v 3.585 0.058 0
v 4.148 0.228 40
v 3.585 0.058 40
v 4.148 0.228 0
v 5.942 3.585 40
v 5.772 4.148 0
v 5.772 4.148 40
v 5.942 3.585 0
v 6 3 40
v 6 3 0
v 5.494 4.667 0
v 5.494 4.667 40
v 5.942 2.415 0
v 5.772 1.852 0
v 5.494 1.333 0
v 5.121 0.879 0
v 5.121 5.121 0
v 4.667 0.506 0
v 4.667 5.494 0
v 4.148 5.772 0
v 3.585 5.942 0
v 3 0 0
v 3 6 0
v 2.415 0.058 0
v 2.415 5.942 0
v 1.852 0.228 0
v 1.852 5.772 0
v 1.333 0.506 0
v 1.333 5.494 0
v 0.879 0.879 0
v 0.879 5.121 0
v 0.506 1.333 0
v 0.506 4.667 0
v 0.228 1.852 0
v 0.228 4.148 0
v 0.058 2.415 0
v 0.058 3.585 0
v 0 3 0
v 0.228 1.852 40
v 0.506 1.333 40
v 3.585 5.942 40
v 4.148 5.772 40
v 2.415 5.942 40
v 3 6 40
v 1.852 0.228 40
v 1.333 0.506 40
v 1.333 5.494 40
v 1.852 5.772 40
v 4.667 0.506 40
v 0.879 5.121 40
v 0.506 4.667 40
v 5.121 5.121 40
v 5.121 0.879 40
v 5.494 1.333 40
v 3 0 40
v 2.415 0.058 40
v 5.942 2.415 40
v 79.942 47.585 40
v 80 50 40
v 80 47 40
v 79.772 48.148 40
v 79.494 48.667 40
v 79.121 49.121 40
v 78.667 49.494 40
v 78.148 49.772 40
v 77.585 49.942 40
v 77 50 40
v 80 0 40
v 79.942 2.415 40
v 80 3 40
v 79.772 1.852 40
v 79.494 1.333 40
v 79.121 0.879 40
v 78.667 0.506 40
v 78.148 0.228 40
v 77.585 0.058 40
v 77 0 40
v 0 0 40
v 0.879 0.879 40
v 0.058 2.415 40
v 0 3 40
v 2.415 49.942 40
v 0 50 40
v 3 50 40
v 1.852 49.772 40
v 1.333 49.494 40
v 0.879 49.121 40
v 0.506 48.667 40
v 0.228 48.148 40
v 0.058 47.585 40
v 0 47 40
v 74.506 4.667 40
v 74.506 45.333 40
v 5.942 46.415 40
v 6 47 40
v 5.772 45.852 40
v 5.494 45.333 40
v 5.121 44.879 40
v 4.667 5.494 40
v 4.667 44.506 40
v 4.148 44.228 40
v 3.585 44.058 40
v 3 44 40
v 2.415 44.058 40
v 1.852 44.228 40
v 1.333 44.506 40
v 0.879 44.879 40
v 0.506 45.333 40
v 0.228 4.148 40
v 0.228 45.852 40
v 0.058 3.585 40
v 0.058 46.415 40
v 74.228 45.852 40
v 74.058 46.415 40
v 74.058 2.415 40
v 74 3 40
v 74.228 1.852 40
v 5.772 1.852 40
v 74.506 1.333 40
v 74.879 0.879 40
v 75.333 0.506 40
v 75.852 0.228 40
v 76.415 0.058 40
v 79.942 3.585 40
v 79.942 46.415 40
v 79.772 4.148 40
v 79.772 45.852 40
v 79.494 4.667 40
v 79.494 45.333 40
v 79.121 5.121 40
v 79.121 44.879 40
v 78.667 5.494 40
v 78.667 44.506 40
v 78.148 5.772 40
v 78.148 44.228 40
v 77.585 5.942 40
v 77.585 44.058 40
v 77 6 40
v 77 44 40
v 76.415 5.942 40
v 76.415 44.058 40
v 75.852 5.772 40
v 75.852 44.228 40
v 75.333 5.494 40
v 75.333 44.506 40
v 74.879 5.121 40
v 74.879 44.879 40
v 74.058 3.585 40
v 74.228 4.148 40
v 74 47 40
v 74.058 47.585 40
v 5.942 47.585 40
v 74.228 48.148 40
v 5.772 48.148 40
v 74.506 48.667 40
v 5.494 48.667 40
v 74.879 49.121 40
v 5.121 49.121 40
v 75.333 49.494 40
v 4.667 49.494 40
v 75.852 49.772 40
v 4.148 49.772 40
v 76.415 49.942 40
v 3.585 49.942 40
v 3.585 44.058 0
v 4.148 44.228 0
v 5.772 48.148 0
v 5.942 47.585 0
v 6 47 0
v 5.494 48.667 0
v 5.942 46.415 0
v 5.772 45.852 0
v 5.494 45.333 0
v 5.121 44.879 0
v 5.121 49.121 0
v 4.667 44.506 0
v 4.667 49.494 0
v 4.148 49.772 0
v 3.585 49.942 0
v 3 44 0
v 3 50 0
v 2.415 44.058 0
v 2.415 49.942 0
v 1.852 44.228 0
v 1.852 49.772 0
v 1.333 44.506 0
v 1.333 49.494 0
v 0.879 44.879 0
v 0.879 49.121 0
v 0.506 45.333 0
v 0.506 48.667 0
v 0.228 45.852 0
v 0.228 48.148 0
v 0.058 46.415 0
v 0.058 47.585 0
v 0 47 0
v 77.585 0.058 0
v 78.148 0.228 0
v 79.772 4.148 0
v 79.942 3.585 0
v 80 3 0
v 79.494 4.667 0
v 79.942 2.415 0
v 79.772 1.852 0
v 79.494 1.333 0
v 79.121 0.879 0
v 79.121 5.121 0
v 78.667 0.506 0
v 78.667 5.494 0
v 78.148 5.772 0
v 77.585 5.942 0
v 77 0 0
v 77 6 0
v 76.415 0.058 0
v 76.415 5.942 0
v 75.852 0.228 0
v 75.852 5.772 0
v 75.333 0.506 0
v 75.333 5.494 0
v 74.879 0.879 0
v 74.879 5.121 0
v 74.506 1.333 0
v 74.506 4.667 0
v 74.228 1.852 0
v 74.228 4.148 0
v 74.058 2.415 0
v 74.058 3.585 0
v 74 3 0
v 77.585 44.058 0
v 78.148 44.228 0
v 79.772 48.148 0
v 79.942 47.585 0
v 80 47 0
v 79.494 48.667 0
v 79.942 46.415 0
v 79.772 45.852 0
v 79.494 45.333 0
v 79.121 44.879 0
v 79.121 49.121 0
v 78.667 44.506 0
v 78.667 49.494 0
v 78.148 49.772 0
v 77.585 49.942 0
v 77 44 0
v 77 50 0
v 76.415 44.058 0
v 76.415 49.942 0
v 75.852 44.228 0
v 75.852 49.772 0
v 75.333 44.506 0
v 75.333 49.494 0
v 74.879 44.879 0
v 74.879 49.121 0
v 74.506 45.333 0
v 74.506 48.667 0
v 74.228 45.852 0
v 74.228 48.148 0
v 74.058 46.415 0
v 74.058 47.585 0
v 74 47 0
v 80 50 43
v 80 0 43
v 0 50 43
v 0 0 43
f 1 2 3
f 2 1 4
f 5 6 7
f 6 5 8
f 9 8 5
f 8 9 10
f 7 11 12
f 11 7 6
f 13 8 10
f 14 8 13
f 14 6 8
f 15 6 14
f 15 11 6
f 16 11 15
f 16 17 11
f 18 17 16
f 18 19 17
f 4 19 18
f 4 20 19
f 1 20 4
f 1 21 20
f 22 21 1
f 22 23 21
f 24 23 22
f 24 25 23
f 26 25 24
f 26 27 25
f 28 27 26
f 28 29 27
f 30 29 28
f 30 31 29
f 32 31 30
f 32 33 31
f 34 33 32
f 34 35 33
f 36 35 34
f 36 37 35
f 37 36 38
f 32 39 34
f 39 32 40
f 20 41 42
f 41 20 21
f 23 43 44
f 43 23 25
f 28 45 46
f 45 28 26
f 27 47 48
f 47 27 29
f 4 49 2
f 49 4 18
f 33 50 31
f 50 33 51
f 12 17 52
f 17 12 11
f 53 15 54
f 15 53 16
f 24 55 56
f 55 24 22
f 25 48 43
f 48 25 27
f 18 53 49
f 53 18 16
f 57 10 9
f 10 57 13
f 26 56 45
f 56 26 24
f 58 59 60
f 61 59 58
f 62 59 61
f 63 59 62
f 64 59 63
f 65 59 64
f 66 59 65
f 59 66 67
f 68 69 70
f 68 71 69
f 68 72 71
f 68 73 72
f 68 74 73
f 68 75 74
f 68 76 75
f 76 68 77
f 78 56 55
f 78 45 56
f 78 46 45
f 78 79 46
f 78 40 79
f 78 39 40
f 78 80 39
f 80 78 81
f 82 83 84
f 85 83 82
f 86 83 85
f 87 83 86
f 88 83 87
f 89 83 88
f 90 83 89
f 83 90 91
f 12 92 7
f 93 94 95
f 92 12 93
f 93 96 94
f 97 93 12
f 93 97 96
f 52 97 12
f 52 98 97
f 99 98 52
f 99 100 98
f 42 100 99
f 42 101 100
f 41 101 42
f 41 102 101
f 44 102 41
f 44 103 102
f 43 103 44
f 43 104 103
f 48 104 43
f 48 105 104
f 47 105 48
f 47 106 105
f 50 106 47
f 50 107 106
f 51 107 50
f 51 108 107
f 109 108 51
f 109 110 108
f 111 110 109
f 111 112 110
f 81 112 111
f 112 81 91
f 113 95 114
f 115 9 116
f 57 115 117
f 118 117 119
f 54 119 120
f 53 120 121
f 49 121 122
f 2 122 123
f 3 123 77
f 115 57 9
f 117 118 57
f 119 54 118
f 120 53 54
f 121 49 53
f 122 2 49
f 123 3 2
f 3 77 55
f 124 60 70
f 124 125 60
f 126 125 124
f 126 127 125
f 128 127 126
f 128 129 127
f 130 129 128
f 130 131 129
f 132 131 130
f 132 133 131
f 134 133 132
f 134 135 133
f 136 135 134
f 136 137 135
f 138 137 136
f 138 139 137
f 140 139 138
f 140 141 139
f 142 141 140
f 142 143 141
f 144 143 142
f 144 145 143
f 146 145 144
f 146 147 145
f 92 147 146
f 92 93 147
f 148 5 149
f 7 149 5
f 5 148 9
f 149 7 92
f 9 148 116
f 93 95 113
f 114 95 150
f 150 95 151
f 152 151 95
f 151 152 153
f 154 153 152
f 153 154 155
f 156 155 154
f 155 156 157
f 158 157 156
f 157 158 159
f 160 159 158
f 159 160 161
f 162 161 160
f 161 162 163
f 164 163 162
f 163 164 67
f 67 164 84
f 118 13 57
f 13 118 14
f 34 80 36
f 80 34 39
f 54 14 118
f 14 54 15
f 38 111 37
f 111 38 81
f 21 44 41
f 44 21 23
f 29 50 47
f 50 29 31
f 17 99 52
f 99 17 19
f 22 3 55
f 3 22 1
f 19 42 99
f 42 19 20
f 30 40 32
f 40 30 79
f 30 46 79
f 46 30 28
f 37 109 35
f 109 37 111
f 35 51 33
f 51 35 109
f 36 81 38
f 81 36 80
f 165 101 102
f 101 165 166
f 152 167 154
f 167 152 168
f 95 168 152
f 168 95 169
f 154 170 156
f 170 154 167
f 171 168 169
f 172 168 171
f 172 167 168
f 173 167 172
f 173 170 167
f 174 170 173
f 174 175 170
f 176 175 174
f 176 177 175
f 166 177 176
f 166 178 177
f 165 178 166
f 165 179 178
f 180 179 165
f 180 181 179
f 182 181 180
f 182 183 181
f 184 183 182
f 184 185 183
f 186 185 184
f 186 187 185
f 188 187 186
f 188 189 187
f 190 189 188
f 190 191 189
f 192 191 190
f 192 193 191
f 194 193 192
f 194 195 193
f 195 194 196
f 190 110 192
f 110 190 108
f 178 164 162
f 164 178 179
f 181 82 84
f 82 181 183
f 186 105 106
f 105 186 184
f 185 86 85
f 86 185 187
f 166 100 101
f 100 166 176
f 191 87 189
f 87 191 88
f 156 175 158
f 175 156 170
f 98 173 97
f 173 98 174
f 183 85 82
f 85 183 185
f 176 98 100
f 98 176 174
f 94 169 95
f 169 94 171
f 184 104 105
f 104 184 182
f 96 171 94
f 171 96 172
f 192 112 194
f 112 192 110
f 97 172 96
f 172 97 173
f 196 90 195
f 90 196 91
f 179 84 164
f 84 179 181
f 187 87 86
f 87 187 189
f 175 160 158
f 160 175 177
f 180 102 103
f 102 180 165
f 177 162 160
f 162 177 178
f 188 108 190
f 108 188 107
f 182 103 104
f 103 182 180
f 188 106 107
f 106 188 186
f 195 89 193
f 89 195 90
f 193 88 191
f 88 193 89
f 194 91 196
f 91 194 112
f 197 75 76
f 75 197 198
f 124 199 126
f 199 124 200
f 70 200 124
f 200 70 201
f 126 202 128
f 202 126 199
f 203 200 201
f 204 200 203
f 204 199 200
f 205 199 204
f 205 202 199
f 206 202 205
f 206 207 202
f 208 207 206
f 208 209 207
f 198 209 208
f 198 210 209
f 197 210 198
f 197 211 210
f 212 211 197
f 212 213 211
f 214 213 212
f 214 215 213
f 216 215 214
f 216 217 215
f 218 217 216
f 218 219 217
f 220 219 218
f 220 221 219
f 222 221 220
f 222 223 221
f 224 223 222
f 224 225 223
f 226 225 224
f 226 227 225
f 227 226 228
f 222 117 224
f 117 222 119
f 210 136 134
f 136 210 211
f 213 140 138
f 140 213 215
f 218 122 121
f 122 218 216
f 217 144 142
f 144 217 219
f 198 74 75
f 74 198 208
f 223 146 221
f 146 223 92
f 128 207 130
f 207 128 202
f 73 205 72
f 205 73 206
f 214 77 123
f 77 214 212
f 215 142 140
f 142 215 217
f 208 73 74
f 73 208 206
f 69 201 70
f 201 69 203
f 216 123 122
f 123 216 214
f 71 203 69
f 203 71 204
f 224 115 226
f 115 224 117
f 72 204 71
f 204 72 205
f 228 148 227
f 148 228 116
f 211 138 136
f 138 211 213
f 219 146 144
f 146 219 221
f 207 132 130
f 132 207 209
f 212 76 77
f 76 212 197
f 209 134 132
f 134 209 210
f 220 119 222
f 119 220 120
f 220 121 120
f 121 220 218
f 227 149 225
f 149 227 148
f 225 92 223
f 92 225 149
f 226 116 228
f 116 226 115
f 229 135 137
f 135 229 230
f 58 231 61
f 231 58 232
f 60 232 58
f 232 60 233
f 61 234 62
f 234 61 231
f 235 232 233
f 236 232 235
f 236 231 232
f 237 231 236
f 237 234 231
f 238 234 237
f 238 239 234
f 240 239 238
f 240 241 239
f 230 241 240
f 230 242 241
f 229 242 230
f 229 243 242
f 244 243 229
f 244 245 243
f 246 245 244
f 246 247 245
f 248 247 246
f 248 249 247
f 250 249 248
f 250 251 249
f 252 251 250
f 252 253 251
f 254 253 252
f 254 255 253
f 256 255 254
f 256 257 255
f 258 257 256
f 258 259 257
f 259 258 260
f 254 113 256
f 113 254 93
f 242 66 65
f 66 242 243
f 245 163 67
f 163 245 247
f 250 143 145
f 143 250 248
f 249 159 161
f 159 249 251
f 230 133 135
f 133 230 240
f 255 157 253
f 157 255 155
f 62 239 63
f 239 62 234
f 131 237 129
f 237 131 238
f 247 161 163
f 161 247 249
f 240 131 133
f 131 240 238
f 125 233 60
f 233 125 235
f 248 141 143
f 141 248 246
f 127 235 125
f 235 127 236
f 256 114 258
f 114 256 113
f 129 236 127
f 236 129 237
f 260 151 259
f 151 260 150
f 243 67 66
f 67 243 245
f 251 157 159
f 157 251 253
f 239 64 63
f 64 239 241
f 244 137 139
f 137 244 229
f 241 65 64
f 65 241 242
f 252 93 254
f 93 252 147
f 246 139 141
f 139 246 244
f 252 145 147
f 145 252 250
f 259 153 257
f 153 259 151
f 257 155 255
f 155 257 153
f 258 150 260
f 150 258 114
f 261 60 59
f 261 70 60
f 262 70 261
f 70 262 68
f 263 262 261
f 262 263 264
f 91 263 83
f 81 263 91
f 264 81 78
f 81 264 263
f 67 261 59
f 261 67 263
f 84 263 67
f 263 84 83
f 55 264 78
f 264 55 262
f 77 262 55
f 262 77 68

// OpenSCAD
module leg(h = 40, r = 3) {
    cylinder(h=h, r=r, $fn=32);
}

module table(w = 80, d = 50, h = 40, top_t = 3) {
    // tabletop
    translate([0, 0, h])
        cube([w, d, top_t]);

    // four legs
    for (x = [0, w - 6], y = [0, d - 6]) {
        translate([x + 3, y + 3, 0])
            leg(h=h);
    }
}

table();
